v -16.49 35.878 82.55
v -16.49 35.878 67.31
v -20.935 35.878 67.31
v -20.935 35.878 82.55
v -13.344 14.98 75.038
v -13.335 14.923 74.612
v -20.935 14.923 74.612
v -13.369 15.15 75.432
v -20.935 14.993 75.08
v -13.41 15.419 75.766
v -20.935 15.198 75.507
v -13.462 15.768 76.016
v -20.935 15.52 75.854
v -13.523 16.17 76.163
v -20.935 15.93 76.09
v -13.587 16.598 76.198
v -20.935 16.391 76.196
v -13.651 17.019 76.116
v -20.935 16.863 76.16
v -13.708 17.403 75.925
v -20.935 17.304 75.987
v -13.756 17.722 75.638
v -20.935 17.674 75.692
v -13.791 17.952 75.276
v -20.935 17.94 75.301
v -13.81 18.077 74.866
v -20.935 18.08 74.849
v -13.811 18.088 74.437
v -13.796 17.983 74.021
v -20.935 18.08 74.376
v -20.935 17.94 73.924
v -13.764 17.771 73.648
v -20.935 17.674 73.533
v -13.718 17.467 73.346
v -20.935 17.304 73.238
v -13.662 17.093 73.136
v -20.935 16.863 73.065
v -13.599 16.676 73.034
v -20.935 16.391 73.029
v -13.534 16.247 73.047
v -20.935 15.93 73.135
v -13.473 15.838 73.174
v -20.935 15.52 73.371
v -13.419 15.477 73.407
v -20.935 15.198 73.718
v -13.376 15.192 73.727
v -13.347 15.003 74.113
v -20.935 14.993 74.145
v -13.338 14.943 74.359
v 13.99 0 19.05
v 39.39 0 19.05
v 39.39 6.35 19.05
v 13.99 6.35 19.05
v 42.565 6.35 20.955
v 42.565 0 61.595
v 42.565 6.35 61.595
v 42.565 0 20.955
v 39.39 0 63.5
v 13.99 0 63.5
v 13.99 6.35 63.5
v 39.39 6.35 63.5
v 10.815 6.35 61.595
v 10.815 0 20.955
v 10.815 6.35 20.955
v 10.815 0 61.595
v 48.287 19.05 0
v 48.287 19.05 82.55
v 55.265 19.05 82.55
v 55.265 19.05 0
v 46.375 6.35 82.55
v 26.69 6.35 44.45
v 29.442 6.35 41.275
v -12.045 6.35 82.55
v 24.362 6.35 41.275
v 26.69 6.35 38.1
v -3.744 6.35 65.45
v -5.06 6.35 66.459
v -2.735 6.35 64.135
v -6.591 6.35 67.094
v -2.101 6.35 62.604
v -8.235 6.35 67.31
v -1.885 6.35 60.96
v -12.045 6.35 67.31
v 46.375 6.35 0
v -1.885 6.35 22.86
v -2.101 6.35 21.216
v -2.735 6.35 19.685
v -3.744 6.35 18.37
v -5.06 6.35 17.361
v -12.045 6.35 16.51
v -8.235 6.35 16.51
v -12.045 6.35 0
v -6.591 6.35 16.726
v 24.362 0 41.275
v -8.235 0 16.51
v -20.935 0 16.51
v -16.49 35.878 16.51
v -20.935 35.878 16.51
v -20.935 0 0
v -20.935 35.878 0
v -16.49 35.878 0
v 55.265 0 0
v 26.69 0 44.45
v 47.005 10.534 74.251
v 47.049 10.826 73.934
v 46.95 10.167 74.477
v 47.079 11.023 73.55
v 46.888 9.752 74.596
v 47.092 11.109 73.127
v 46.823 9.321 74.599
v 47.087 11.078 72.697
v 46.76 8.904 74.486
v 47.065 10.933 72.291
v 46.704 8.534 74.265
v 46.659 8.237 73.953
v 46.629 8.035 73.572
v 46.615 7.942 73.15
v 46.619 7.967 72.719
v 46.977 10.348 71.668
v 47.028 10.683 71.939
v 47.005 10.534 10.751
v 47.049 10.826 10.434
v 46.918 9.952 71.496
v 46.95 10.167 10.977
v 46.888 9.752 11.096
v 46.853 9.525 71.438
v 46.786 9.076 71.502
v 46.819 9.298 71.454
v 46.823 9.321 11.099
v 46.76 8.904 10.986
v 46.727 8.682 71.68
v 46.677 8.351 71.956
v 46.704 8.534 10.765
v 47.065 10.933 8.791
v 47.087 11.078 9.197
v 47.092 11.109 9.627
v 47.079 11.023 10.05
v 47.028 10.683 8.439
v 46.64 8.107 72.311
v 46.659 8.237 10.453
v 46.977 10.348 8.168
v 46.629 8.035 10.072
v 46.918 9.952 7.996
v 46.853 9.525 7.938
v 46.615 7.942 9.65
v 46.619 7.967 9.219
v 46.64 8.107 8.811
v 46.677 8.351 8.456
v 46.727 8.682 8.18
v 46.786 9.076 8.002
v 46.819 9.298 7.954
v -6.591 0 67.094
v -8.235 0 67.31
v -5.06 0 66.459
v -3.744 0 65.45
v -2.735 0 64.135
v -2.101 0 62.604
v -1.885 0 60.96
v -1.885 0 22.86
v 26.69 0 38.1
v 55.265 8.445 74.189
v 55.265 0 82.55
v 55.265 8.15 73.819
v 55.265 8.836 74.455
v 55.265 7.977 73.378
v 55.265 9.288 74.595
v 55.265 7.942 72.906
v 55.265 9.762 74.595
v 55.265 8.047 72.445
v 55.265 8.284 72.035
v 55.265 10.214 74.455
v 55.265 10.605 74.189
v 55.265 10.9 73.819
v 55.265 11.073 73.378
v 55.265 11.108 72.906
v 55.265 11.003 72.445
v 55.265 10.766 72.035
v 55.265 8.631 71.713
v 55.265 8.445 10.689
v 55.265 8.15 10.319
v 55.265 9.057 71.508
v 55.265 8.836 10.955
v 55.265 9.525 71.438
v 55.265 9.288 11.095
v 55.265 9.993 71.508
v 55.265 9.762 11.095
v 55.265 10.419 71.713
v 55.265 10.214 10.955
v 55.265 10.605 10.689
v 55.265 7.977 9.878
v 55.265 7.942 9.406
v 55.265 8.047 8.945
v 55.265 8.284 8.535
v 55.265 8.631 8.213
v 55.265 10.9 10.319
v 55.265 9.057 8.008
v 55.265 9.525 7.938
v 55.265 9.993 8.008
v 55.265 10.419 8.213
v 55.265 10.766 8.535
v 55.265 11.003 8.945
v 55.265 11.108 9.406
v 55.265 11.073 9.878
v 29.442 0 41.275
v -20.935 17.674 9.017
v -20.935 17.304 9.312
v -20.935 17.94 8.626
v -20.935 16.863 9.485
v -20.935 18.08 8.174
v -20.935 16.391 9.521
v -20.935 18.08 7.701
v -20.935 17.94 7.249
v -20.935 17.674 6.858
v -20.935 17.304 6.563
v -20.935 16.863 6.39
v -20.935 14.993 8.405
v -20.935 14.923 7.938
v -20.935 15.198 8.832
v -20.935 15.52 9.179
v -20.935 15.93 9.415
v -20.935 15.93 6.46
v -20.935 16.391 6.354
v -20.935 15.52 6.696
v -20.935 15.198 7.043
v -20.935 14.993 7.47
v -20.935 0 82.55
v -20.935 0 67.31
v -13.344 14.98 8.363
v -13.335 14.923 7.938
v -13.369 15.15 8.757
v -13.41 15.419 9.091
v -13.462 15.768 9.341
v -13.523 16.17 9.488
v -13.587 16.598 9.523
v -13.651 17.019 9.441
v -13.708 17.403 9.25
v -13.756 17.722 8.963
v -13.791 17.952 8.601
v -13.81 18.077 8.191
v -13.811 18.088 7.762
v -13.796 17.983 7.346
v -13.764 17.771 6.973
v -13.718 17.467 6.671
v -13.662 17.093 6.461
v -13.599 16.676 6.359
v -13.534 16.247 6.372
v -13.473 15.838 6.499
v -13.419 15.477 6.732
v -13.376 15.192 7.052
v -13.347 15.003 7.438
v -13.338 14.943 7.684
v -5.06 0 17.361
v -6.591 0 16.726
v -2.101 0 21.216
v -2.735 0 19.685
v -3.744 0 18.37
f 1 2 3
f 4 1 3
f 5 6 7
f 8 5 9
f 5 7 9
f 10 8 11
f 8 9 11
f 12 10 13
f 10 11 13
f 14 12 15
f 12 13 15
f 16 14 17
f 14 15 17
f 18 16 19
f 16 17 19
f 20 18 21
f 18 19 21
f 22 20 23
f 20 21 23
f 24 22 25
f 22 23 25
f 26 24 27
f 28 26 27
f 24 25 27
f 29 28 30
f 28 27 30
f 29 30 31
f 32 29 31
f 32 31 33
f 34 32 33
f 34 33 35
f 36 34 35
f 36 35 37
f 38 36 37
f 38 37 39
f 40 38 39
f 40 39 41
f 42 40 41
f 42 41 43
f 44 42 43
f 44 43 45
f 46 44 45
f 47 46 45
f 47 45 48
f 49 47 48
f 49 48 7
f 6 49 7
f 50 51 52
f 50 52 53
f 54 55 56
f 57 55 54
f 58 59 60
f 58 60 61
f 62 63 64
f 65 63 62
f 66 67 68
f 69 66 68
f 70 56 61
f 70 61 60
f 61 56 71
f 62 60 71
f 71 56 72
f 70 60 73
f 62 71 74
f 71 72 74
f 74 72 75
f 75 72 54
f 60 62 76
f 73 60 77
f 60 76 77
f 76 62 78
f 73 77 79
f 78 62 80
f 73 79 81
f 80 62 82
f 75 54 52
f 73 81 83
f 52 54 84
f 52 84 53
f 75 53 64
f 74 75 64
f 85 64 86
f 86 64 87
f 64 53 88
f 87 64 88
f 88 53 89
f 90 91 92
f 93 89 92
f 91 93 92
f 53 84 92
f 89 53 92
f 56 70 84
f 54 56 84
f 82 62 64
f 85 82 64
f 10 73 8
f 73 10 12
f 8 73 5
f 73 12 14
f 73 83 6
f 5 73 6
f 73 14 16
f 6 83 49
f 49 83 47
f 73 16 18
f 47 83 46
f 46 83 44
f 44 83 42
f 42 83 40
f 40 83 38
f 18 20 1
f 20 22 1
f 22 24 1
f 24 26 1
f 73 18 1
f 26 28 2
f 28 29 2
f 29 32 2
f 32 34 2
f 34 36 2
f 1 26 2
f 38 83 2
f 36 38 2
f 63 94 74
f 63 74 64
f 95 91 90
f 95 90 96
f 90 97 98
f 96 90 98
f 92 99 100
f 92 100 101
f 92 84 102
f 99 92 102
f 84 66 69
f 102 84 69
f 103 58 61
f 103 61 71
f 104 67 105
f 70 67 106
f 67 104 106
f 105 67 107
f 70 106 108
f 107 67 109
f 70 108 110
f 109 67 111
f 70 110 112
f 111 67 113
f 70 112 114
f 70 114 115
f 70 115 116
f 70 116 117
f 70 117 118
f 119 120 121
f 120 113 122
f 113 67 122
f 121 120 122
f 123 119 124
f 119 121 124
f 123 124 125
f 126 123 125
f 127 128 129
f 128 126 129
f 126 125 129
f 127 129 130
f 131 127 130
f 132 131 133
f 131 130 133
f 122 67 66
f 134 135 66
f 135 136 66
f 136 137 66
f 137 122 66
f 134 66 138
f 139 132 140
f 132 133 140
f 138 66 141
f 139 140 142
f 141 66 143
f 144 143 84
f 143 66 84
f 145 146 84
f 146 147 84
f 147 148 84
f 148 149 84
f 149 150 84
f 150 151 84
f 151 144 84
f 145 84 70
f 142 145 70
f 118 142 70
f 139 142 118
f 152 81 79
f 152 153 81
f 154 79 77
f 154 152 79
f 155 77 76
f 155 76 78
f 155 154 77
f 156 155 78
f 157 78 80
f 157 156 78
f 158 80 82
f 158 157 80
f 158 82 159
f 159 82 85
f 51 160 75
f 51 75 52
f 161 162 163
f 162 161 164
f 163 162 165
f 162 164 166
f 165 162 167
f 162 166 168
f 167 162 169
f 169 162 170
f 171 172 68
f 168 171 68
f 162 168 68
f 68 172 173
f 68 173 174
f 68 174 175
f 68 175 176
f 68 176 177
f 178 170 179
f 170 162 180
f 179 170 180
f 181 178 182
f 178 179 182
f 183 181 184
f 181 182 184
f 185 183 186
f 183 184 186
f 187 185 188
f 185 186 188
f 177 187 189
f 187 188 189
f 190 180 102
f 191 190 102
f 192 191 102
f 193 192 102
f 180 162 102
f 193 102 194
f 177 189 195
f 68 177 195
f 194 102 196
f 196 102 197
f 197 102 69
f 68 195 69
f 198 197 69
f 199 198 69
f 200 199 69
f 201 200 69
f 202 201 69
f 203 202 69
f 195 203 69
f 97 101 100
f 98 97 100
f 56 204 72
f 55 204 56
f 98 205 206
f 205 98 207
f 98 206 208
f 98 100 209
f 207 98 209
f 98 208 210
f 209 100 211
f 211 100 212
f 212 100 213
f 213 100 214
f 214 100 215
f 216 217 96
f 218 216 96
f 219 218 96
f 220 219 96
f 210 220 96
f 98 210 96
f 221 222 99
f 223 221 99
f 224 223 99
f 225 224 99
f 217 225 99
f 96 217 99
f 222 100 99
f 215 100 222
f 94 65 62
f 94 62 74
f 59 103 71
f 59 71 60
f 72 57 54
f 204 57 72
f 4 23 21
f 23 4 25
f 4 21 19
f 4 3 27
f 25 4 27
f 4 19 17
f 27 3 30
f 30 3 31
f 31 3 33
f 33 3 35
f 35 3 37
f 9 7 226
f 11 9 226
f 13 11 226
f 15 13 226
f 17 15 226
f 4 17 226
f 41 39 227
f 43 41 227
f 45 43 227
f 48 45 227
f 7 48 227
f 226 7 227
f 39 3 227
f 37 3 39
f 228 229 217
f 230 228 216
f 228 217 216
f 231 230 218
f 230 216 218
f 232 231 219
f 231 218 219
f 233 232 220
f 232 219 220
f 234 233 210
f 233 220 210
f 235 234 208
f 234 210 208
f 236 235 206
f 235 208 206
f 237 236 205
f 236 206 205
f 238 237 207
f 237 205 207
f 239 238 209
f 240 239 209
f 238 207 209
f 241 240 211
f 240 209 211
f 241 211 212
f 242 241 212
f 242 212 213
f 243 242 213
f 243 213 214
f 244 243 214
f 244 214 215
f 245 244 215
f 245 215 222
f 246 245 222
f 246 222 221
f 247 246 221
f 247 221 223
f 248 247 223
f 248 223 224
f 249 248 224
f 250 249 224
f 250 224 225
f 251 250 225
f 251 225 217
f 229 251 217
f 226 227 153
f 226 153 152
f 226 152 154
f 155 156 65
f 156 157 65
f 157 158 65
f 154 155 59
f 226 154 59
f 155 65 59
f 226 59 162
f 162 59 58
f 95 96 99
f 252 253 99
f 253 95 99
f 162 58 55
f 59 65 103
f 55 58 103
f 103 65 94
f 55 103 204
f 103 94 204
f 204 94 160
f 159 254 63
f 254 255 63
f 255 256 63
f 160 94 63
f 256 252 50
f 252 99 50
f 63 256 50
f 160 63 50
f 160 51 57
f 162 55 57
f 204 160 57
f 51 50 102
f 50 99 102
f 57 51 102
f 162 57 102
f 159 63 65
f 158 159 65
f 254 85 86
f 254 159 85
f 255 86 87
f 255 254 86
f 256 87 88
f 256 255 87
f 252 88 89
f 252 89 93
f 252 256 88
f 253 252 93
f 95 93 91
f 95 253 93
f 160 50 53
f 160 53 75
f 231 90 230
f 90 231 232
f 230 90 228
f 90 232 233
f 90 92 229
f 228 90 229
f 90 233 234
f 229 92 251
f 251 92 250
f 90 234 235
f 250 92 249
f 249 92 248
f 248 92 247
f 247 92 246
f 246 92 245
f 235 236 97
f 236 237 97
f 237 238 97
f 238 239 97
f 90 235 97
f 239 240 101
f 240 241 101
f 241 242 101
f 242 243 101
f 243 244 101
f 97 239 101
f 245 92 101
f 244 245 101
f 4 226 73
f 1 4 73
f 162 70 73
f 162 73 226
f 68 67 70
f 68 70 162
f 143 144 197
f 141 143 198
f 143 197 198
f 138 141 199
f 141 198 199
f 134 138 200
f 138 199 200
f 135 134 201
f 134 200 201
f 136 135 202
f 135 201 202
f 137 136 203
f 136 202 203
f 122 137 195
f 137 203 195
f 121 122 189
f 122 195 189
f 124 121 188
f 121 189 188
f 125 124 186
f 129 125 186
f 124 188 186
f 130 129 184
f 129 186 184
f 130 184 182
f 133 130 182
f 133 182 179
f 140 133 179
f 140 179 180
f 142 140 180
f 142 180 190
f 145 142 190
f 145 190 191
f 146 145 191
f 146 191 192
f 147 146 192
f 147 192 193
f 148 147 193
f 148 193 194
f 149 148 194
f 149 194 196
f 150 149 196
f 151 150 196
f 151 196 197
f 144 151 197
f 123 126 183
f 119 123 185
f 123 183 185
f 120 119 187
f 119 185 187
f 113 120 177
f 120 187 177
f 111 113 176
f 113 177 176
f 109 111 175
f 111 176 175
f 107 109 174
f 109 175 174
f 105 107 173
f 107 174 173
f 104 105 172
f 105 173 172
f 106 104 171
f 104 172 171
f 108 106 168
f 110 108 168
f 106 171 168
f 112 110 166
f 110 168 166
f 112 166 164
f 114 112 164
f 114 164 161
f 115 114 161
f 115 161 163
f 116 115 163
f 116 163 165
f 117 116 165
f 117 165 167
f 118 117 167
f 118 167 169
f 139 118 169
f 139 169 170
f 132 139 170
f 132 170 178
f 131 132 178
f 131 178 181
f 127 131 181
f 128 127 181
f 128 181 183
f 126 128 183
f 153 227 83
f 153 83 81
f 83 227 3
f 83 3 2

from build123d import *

# Parameters (mm, degrees)
BOSS_EXTRUDE1_DEPTH = 82.55
CUT_EXTRUDE1_DEPTH  = 50.8
FILLET1_R           = 6.35
SKETCH3_W           = 18.816678221
SKETCH3_H           = 21.85775753
CUT_EXTRUDE2_DEPTH  = 101.6
CUT_EXTRUDE3_DEPTH  = 50.8
SKETCH5_R           = 1.5875
CUT_EXTRUDE4_DEPTH  = 25.4
SKETCH6_R           = 1.5875
CUT_EXTRUDE5_DEPTH  = 10.16


with BuildPart() as part:
    # Sketch1 → Boss-Extrude1 (new body)
    with BuildSketch(Plane.XY):
        Polygon((-20.934516129, 0), (55.265483871, 0), (55.265483871, 35.8775), (50.820483871, 35.8775), (46.375483871, 6.35), (-12.044516129, 6.35), (-16.489516129, 35.8775), (-20.934516129, 35.8775), align=None)
    extrude(amount=BOSS_EXTRUDE1_DEPTH)

    # Sketch2 → Cut-Extrude1 (cut)
    with BuildSketch(Plane(origin=(0, 35.8775, 0), x_dir=(1, 0, 0), z_dir=(0, 1, 0))):
        Polygon((-1.884516129, -53.975), (-1.884516129, -28.575), (-1.884516129, -16.51), (-20.934516129, -16.51), (-20.934516129, -67.31), (-1.884516129, -67.31), align=None)
    extrude(amount=-CUT_EXTRUDE1_DEPTH, mode=Mode.SUBTRACT)

    # Fillet1
    fillet1_edges = [part.edges().sort_by_distance(p)[0] for p in [
        (-1.884516129, 3.175, 16.51),
        (-1.884516129, 3.175, 67.31),
    ]]
    fillet(fillet1_edges, radius=FILLET1_R)

    # Sketch3 → Cut-Extrude2 (cut)
    with BuildSketch(Plane.XY.offset(82.55)):
        with Locations((52.042862191, 29.978878765)):
            Rectangle(SKETCH3_W, SKETCH3_H)
    extrude(amount=-CUT_EXTRUDE2_DEPTH, mode=Mode.SUBTRACT)

    # Sketch4 → Cut-Extrude3 (cut)
    with BuildSketch(Plane.XZ):
        Polygon((13.990483871, 63.5), (39.390483871, 63.5), (26.690483871, 44.45), align=None)
        Polygon((10.815483871, 61.595), (24.362150538, 41.275), (10.815483871, 20.955), align=None)
        Polygon((42.565483871, 61.595), (42.565483871, 20.955), (29.442150538, 41.275), align=None)
        Polygon((13.990483871, 19.05), (26.690483871, 38.1), (39.390483871, 19.05), align=None)
    extrude(amount=-CUT_EXTRUDE3_DEPTH, mode=Mode.SUBTRACT)

    # Sketch5 → Cut-Extrude4 (cut)
    with BuildSketch(Plane.ZY.offset(20.934516129)):
        with Locations(Location((7.9375, 16.51, 0), (0, 0, 270))):
            Circle(SKETCH5_R)
        with Locations(Location((74.6125, 16.51, 0), (0, 0, 270))):
            Circle(SKETCH5_R)
    extrude(amount=-CUT_EXTRUDE4_DEPTH, mode=Mode.SUBTRACT)

    # Sketch6 → Cut-Extrude5 (cut)
    with BuildSketch(Plane(origin=(55.265483871, 0, 0), x_dir=(0, 0, -1), z_dir=(1, 0, 0))):
        with Locations((-9.525, 9.525)):
            Circle(SKETCH6_R)
        with Locations((-73.025, 9.525)):
            Circle(SKETCH6_R)
    extrude(amount=-CUT_EXTRUDE5_DEPTH, mode=Mode.SUBTRACT)


solid = part.part
